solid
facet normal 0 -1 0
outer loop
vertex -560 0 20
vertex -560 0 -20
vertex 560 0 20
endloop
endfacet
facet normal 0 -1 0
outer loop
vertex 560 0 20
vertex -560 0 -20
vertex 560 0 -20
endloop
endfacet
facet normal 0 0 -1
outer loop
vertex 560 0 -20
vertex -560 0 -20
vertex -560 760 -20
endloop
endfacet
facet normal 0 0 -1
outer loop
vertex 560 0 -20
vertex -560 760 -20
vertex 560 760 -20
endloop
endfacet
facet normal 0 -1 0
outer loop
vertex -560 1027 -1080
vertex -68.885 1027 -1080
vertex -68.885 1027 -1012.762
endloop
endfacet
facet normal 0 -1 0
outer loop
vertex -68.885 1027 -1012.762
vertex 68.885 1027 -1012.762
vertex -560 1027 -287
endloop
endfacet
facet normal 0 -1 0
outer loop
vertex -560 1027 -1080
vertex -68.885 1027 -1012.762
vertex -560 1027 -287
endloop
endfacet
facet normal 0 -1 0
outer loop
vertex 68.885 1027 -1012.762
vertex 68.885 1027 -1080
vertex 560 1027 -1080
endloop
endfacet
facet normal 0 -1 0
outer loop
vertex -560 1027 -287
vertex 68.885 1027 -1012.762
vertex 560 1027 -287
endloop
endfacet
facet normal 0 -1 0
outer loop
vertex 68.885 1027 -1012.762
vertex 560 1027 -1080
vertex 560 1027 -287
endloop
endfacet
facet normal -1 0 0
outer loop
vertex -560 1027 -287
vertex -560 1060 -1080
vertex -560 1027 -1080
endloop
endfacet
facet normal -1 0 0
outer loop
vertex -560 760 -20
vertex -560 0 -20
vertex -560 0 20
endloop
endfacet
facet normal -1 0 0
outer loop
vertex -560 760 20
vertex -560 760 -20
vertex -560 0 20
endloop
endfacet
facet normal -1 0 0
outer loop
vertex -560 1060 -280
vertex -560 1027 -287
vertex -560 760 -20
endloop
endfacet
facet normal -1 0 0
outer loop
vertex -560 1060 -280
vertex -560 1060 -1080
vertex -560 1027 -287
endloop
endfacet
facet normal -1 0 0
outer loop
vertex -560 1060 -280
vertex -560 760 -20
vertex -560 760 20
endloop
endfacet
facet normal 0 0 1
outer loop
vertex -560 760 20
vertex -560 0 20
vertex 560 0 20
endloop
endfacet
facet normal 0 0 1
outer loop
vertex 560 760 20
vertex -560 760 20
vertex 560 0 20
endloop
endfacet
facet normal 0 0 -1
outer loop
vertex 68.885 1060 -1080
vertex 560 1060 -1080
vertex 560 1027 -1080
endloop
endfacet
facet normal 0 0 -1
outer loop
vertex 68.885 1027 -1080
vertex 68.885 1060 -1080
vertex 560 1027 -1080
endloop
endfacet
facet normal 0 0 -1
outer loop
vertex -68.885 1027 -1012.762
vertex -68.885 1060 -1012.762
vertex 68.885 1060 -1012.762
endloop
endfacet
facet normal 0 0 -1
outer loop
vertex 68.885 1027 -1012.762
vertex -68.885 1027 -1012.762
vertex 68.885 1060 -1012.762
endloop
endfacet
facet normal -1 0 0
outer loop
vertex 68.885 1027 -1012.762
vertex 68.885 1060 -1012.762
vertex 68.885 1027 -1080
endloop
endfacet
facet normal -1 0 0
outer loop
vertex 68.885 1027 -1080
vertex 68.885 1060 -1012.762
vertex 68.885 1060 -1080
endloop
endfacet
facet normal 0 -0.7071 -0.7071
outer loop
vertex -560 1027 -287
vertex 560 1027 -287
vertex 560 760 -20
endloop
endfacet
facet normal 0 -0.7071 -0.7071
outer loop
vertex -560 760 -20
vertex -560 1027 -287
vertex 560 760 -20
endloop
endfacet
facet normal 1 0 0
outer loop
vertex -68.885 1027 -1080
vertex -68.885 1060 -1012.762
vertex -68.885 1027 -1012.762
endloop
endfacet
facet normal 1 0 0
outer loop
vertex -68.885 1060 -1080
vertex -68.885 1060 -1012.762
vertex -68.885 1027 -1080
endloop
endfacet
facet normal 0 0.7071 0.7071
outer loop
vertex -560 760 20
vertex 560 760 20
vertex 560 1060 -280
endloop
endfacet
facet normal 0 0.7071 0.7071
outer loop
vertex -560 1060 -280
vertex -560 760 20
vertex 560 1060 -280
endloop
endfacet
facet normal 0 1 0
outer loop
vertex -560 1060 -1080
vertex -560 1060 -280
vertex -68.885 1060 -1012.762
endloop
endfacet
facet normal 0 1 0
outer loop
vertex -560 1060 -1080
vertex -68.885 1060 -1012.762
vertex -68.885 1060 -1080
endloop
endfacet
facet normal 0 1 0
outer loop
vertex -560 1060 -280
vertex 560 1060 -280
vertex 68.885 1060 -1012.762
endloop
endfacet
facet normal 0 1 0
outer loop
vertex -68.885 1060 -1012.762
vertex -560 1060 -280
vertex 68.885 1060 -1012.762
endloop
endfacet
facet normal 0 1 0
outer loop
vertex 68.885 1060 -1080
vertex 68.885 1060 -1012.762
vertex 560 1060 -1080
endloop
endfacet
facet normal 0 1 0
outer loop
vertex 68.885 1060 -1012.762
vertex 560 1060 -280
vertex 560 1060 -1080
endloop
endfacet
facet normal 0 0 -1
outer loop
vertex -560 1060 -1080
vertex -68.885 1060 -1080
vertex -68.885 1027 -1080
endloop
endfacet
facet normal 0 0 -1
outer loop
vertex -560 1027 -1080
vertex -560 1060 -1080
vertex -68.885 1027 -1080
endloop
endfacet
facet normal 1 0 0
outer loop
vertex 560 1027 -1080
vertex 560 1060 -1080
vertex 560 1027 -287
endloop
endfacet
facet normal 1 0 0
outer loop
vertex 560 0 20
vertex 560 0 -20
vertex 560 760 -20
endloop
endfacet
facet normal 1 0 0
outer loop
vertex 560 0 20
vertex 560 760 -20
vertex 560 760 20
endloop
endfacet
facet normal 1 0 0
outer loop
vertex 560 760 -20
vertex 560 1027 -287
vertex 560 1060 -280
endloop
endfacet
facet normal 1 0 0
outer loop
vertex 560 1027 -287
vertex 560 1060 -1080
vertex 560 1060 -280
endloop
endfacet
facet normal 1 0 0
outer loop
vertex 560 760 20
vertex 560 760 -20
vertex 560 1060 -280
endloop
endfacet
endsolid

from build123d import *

# Parameters (mm, degrees)
SKETCH1_W           = 1120
SKETCH1_H           = 40
BOSS_EXTRUDE1_DEPTH = 760
BOSS_EXTRUDE2_DEPTH = 1120
BOSS_EXTRUDE3_DEPTH = 1120
SKETCH4_W           = 137.769014226
SKETCH4_H           = 67.23794826
CUT_EXTRUDE1_DEPTH  = 1120


with BuildPart() as part:
    # Sketch1 → Boss-Extrude1 (new body)
    with BuildSketch(Plane(origin=(0, 0, 0), x_dir=(1, 0, 0), z_dir=(0, 1, 0))):
        Rectangle(SKETCH1_W, SKETCH1_H)
    extrude(amount=BOSS_EXTRUDE1_DEPTH)

    # Sketch2 → Boss-Extrude2 (add)
    with BuildSketch(Plane(origin=(560, 0, 0), x_dir=(0, 0, -1), z_dir=(1, 0, 0))):
        Polygon((-20, 760), (280, 1060), (320, 1060), (20, 760), align=None)
    extrude(amount=-BOSS_EXTRUDE2_DEPTH)

    # Sketch3 → Boss-Extrude3 (add)
    with BuildSketch(Plane(origin=(560, 0, 0), x_dir=(0, 0, -1), z_dir=(1, 0, 0))):
        Polygon((320, 1060), (1080, 1060), (1080, 1027), (285.570778589, 1027), align=None)
    extrude(amount=-BOSS_EXTRUDE3_DEPTH)

    # Sketch4 → Cut-Extrude1 (cut)
    with BuildSketch(Plane(origin=(0, 1060, 0), x_dir=(1, 0, 0), z_dir=(0, 1, 0))):
        with Locations((0, 1046.38102587)):
            Rectangle(SKETCH4_W, SKETCH4_H)
    extrude(amount=-CUT_EXTRUDE1_DEPTH, mode=Mode.SUBTRACT)


solid = part.part
